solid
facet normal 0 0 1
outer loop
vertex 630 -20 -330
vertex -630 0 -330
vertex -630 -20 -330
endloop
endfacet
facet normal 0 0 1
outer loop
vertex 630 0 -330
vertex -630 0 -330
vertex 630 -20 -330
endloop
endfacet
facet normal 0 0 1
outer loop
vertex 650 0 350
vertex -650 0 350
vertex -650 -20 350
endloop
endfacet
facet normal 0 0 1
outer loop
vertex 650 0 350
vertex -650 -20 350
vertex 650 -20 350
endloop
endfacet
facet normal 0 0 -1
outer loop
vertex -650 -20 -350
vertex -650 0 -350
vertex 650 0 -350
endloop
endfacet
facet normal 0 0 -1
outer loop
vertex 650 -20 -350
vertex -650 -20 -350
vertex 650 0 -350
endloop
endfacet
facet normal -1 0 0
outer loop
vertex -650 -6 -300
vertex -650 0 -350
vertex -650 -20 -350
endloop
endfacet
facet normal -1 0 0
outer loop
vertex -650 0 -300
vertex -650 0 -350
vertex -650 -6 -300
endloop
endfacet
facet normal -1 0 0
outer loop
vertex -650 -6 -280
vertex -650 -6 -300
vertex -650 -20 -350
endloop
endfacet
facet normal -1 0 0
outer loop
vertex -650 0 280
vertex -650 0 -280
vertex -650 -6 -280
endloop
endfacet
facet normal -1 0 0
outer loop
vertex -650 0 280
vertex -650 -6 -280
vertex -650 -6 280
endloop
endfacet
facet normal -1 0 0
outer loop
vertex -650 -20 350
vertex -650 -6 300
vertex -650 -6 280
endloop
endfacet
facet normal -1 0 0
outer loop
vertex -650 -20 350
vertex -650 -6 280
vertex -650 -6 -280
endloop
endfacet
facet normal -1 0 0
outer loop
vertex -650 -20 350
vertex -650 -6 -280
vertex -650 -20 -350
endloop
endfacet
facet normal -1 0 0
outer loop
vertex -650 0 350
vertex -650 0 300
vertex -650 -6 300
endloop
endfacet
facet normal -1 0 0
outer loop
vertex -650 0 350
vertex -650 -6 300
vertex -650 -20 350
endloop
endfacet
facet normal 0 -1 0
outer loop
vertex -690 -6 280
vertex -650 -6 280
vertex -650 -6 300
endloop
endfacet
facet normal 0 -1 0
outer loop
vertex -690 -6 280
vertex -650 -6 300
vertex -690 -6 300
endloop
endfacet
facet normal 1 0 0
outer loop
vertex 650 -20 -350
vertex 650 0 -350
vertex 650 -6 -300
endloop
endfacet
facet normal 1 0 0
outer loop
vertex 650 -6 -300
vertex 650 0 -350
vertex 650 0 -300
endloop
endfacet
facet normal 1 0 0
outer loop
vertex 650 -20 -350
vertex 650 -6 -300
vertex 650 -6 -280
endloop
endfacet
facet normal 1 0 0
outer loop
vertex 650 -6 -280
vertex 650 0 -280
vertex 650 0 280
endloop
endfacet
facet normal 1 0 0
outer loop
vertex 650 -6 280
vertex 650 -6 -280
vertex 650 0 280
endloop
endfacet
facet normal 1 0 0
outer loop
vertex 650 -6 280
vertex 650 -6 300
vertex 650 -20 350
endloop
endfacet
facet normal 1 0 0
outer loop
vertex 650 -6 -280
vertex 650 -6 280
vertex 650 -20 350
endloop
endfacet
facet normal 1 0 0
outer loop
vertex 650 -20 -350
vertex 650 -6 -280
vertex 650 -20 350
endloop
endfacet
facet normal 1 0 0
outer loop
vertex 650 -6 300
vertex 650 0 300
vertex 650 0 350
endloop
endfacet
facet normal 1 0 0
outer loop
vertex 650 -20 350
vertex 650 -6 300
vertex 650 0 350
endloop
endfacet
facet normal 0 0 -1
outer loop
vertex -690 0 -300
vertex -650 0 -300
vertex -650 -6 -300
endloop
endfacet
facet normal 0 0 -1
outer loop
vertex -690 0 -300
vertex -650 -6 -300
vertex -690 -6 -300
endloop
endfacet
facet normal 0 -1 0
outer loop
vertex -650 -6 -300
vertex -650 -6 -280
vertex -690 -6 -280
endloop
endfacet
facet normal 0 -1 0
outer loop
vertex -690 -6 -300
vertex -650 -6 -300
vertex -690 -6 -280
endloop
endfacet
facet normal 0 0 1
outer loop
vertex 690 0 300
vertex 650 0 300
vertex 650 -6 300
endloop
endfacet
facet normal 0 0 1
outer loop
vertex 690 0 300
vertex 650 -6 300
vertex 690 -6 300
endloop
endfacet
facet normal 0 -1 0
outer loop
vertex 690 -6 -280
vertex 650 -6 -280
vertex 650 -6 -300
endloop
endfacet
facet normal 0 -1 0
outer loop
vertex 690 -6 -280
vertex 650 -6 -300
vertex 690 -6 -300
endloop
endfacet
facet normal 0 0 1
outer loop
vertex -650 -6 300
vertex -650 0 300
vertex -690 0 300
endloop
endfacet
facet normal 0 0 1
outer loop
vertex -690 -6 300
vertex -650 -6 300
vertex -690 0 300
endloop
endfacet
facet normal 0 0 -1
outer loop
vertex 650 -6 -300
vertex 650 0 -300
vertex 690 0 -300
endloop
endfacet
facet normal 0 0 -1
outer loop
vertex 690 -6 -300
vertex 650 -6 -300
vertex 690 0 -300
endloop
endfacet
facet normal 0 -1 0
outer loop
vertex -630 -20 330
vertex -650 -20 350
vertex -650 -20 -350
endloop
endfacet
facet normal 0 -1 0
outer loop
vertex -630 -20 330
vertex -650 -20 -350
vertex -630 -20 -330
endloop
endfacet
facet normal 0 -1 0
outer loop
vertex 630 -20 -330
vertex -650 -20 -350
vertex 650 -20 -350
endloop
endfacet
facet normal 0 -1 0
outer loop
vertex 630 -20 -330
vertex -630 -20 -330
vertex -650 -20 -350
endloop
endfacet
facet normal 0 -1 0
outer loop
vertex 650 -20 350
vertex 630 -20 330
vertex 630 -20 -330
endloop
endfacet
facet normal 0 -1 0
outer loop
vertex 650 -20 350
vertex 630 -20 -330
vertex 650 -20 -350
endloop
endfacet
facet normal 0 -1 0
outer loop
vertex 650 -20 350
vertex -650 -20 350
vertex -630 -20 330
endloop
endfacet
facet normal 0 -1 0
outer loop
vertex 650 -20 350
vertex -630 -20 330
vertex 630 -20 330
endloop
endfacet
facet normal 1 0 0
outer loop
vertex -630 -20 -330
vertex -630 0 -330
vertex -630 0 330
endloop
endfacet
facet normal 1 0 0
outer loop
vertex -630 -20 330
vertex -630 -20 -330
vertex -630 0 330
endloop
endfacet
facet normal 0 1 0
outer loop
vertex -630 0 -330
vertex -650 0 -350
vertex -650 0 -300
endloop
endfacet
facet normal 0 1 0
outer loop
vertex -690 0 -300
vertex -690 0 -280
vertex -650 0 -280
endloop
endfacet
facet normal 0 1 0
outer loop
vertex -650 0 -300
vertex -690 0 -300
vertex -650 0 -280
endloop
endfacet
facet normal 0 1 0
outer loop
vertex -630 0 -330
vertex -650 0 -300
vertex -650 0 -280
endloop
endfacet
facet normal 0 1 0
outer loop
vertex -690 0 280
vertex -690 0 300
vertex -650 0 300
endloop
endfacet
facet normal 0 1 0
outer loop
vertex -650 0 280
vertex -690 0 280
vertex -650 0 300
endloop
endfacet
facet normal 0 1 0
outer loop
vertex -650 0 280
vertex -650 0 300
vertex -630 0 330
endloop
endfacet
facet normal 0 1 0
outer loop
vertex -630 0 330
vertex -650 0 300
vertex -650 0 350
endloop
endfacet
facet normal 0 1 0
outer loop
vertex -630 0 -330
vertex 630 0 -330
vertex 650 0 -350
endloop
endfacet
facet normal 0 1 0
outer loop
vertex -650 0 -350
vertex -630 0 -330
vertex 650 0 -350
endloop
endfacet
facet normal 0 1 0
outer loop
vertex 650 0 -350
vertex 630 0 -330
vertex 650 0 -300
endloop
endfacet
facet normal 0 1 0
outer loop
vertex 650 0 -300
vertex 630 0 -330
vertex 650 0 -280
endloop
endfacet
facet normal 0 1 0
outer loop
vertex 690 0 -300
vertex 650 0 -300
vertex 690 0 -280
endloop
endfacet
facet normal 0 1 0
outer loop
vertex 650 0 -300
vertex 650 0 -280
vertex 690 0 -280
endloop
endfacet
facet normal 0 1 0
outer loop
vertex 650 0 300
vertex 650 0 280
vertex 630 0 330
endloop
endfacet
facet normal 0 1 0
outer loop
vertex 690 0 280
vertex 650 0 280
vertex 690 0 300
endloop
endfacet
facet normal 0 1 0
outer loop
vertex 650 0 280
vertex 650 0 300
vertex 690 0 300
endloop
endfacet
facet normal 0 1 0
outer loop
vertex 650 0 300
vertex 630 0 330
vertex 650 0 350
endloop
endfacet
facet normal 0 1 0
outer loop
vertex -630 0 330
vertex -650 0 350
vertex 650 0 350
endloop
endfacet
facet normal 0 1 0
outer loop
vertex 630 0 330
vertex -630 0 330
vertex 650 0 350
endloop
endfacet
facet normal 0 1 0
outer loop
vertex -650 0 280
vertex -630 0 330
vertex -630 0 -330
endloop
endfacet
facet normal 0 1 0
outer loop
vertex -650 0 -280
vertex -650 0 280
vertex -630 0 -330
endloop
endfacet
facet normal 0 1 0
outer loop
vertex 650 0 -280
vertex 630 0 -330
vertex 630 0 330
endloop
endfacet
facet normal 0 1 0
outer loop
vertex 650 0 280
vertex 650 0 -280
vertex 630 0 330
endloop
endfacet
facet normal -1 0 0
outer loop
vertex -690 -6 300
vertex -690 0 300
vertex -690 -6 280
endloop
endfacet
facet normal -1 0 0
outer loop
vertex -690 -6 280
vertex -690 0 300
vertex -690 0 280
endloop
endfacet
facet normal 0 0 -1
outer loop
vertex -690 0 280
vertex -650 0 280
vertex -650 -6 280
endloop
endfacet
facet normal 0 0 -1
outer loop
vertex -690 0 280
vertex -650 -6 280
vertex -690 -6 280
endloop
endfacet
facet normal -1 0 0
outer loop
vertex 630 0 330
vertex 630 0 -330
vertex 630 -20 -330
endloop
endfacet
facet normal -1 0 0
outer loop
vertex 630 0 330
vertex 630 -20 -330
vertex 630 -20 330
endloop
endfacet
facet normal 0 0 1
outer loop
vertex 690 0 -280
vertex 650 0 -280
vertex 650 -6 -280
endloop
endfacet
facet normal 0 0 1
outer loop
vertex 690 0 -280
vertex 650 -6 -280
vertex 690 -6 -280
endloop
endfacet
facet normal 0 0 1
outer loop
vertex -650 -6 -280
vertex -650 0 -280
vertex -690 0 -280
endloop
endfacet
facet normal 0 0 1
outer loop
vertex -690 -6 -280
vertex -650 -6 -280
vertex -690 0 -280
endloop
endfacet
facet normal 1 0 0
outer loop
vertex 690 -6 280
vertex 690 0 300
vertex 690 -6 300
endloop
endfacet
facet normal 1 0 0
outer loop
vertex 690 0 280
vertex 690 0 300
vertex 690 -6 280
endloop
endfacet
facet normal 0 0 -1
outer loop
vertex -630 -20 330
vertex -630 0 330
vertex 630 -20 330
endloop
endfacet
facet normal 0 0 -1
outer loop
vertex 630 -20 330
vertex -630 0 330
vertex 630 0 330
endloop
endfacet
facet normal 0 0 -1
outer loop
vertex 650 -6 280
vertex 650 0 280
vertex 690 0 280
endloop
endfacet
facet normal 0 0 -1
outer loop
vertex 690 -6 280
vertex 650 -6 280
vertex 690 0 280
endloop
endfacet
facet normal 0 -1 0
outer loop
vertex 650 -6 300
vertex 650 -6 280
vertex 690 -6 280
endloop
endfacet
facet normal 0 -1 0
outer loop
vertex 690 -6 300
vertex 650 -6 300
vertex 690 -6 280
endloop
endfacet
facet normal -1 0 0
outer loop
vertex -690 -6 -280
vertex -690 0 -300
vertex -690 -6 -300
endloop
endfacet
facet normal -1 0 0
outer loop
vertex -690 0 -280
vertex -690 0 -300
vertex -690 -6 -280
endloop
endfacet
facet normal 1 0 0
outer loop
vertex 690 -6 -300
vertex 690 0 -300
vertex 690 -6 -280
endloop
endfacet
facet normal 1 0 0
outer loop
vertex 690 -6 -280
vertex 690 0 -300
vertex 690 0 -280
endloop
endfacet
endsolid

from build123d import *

# Parameters (mm, degrees)
F0_W     = 1300
F0_H     = 700
F0_W_2   = 1260
F0_H_2   = 660
F1_DEPTH = 20
F2_W     = 40
F2_H     = 20
F3_DEPTH = 6


with BuildPart() as f1:
    # F0 (on Front) → F1 (new body)
    with BuildSketch(Plane.XZ):
        Rectangle(F0_W, F0_H)
        Rectangle(F0_W_2, F0_H_2, mode=Mode.SUBTRACT)
    extrude(amount=F1_DEPTH)

    # F2 (on Front) → F3 (join)
    with BuildSketch(Plane.XZ):
        with Locations((670, -290)):
            Rectangle(F2_W, F2_H)
    extrude(amount=F3_DEPTH)

    # F4: F1 across plane


with BuildPart() as f1_1:
    add(f1.part)
    add(f1.part.mirror(Plane.XY))

    # F5: F1 across plane


with BuildPart() as f1_2:
    add(f1_1.part)
    add(f1_1.part.mirror(Plane.YZ))


solid = f1_2.part
